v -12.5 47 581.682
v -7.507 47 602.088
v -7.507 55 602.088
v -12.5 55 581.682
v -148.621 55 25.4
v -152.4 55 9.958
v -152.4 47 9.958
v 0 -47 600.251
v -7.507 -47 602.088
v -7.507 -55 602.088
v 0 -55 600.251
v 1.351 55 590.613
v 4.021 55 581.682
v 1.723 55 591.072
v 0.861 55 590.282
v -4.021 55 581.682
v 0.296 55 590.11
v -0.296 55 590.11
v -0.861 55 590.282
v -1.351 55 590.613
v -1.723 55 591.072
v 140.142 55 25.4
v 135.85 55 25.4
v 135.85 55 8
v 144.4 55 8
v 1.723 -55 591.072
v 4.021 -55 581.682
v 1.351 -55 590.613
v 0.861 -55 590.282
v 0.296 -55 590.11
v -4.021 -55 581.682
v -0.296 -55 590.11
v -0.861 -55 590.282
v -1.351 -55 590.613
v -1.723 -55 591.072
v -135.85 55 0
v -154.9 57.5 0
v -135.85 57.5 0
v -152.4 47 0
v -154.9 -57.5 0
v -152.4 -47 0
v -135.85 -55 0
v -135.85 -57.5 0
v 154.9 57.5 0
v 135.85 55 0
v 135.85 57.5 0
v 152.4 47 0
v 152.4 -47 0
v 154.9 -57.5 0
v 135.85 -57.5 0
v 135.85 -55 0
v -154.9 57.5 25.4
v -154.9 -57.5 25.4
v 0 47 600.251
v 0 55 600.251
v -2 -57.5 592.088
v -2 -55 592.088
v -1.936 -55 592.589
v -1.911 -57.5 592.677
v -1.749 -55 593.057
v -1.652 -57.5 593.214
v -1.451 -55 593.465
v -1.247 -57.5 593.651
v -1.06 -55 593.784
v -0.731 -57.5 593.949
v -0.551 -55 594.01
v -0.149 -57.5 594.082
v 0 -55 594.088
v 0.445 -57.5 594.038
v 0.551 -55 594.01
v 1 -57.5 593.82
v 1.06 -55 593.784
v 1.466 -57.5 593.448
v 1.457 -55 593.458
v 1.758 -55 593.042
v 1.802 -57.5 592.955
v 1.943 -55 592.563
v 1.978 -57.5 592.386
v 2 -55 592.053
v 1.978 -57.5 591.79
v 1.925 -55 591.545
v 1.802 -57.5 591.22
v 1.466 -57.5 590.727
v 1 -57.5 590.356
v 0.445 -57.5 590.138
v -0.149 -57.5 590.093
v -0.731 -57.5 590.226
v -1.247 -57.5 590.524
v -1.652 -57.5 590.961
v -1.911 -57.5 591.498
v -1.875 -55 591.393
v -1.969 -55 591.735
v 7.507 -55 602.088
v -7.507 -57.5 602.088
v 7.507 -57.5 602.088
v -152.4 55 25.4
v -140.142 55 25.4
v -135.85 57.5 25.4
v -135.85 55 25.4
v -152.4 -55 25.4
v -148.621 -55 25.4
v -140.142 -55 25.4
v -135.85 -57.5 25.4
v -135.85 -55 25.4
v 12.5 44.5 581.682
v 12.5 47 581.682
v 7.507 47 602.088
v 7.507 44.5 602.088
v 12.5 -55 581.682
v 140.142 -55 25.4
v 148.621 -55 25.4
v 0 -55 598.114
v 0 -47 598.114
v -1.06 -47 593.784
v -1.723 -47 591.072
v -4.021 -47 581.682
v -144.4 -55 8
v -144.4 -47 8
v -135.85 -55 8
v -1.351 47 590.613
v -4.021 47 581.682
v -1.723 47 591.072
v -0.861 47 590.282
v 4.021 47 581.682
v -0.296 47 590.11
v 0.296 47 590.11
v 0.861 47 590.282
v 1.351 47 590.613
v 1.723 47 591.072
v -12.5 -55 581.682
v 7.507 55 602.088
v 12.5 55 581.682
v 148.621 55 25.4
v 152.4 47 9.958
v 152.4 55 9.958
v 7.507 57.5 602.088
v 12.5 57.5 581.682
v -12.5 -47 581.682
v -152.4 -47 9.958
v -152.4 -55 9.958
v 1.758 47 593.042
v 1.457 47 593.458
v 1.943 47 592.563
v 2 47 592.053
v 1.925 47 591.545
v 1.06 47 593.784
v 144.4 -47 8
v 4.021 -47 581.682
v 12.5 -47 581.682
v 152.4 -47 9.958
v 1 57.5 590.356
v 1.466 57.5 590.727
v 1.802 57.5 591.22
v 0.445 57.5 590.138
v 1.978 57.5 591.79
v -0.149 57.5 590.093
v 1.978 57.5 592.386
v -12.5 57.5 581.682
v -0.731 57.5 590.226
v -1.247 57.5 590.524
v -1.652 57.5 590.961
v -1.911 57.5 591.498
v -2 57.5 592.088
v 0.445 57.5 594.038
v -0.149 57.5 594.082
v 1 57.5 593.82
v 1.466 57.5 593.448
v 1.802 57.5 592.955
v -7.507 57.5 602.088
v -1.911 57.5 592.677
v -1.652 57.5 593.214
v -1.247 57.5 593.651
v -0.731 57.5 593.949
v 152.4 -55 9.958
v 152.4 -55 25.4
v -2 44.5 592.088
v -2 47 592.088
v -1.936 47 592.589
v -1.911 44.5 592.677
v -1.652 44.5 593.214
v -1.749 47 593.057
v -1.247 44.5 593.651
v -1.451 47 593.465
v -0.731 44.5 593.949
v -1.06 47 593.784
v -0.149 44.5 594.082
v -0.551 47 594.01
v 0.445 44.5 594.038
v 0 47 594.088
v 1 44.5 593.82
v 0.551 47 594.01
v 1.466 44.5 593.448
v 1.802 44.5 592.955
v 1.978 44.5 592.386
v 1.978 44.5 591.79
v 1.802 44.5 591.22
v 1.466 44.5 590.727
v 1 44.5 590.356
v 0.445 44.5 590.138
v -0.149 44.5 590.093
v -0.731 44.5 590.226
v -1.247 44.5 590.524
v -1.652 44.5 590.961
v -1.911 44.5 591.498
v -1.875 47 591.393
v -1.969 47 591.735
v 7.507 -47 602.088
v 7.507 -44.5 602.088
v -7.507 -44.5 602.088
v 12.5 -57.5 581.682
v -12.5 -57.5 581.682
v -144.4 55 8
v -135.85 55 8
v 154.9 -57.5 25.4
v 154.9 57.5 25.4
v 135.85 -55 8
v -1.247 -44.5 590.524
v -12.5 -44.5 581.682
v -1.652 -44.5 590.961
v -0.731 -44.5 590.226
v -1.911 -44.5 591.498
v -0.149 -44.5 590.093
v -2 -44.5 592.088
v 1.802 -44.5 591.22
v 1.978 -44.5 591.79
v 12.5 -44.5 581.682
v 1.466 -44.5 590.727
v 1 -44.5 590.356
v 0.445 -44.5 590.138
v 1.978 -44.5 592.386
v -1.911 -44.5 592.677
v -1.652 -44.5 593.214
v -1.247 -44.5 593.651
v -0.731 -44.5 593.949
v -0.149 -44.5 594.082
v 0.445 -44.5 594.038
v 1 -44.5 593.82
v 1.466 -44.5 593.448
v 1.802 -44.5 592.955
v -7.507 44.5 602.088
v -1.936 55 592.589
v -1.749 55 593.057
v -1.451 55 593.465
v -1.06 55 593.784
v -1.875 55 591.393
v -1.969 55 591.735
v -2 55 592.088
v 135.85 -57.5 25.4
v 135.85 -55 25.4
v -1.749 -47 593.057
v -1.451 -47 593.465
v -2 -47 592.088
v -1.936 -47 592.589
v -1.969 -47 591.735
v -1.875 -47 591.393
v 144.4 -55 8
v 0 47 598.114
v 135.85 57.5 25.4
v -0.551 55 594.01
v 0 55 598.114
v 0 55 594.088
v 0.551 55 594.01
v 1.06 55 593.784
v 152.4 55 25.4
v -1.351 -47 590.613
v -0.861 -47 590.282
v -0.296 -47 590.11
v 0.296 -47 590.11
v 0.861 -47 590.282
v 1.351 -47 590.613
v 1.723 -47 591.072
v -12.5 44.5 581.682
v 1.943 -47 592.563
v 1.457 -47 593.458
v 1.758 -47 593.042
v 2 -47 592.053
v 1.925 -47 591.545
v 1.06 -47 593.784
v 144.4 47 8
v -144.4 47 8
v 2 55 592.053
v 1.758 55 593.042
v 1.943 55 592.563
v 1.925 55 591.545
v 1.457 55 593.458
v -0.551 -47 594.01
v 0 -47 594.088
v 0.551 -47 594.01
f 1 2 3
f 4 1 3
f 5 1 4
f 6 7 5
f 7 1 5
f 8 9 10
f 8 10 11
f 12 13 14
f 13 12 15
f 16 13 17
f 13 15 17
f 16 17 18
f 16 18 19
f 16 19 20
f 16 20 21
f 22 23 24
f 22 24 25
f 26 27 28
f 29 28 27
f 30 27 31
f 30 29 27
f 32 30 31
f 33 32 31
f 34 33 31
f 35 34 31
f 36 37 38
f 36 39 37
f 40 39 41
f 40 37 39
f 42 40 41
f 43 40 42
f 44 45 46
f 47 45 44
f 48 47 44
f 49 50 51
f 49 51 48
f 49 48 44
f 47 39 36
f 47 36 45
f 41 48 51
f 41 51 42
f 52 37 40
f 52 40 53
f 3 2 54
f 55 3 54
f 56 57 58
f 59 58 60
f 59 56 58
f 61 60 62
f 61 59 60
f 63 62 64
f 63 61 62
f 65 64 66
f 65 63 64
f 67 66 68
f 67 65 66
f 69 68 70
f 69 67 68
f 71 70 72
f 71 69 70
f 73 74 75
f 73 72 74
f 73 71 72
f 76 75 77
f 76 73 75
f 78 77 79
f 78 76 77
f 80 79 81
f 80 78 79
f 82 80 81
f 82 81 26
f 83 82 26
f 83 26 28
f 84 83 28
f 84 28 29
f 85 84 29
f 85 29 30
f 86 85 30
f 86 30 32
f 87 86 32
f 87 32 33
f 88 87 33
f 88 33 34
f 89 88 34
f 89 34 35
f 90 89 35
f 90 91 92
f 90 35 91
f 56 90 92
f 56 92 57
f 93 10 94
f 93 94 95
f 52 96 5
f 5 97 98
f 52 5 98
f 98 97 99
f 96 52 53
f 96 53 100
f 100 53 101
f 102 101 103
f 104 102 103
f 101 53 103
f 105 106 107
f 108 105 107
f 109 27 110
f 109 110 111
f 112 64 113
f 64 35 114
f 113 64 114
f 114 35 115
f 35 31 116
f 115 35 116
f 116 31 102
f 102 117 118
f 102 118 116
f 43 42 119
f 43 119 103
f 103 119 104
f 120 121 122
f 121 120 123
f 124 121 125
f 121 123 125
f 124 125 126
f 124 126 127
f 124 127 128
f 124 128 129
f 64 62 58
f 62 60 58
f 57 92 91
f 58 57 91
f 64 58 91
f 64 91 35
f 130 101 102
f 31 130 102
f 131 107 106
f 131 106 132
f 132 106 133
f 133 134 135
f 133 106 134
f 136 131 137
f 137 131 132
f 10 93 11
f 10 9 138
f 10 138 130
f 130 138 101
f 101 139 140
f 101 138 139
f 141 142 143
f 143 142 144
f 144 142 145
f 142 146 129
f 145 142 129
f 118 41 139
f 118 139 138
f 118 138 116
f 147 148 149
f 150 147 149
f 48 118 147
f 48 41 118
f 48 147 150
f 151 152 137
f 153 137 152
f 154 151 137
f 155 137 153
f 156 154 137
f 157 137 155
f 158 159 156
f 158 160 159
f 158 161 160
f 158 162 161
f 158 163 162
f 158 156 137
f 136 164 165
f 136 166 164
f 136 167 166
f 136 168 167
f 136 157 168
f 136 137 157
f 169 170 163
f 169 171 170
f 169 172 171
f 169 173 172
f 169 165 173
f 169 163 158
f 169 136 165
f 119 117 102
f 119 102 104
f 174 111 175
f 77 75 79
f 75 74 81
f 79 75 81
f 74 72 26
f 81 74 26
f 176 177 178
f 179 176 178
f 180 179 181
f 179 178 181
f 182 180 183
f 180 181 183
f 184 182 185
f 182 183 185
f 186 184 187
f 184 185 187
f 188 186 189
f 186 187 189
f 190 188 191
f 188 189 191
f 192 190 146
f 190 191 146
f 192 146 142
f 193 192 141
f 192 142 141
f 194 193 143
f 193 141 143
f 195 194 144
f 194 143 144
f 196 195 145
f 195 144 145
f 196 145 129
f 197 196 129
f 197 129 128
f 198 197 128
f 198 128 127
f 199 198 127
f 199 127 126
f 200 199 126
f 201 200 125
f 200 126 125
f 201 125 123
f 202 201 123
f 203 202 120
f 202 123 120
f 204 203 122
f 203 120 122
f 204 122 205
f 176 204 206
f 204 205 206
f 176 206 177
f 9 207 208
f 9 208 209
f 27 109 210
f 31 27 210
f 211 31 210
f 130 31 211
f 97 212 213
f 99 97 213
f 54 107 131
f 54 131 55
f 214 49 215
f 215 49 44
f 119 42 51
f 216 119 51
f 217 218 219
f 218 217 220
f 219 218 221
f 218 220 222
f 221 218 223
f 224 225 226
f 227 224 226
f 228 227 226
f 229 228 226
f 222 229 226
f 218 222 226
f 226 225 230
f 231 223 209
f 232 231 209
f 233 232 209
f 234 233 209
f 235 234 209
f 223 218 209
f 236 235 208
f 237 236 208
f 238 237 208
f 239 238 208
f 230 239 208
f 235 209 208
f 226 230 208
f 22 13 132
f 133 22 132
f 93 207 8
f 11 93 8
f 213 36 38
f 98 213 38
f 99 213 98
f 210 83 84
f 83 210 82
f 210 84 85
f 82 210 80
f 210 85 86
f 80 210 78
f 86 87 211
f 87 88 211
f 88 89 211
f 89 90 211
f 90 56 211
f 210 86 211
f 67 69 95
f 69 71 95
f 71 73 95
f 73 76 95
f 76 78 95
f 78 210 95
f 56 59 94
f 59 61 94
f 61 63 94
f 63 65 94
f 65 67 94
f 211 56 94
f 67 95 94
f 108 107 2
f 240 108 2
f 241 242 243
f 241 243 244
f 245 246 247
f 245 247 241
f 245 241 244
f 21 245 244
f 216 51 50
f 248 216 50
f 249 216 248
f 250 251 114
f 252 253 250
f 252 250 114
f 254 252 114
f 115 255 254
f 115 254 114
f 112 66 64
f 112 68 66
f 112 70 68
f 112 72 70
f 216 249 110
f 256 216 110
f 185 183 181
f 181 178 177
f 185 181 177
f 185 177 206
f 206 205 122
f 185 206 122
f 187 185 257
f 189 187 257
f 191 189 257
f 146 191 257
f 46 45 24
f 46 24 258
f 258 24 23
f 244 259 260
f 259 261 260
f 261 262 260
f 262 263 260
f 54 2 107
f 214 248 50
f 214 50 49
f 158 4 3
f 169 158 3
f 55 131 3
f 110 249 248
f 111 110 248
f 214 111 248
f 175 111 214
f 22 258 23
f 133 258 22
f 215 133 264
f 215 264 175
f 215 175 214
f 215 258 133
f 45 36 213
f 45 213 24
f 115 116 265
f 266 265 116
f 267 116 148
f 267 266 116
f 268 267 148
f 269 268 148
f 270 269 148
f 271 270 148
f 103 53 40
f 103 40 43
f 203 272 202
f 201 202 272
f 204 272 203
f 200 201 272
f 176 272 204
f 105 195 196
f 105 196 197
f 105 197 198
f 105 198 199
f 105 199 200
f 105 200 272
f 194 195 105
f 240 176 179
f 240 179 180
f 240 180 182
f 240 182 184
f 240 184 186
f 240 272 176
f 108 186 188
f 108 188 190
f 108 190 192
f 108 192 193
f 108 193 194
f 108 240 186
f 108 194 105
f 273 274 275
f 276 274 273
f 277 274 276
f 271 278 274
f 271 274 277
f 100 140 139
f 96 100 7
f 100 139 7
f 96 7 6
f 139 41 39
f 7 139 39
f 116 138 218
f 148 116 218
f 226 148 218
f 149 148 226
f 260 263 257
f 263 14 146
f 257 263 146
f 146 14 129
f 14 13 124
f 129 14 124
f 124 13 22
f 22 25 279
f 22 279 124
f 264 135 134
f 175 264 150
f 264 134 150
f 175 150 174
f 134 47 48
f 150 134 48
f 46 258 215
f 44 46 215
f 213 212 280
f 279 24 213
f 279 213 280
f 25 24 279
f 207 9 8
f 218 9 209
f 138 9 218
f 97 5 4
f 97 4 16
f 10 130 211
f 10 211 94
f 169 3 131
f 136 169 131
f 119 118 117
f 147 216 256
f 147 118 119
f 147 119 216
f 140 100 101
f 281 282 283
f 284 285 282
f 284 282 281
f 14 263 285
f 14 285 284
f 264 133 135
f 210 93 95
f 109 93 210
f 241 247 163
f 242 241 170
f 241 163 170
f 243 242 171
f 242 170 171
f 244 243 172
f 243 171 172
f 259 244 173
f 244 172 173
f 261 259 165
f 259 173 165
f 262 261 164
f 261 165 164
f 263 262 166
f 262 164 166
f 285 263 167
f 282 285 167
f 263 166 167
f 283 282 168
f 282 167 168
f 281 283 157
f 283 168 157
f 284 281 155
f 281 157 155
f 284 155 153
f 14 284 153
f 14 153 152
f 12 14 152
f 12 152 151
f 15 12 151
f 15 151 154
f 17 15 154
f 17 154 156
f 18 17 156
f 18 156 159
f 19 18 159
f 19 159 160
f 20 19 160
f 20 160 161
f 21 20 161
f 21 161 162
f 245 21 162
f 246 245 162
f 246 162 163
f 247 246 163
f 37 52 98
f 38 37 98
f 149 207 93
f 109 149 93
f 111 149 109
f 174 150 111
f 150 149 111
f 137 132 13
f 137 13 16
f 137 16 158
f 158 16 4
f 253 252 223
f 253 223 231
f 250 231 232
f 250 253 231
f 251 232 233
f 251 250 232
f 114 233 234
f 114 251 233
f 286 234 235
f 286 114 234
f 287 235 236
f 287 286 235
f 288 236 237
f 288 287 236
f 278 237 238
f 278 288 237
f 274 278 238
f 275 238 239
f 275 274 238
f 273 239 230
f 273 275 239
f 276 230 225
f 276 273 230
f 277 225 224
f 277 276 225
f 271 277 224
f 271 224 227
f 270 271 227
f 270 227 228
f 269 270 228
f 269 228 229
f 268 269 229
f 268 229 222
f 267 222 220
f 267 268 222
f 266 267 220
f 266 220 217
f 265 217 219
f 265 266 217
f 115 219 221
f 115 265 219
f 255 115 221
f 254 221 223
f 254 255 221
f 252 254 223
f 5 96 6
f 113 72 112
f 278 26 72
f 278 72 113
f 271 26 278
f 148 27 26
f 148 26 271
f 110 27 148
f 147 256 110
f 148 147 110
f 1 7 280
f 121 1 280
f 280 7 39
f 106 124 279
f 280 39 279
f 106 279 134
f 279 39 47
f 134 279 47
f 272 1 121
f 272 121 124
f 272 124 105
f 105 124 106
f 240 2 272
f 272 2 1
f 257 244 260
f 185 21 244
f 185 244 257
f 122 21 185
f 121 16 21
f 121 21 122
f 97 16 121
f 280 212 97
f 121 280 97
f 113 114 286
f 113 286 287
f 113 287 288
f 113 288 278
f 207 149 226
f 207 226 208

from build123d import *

# Parameters (mm, degrees)
F0_W      = 304.8
F0_H      = 8
F1_DEPTH  = 8
F2_DEPTH  = 25.4
F3_W      = 19.05
F3_H      = 25.4
F4_DEPTH  = 2.5
F6_W      = 8
F6_H      = 8
F7_DEPTH  = 25
F9_DEPTH  = 8
F12_DEPTH = 609.6
F13_DEPTH = 609.6
F15_DEPTH = 2.5
F17_DEPTH = 2.5
F18_R     = 2
F19_DEPTH = 13


with BuildPart() as f1:
    # F0 (on Top) → F1 (new body)
    with BuildSketch(Plane.XY):
        with Locations((0, 51)):
            Rectangle(F0_W, F0_H)
    extrude(amount=F1_DEPTH)



with BuildPart() as f1b:
    # F0 (on Top) → F1, piece 2 (new body)
    with BuildSketch(Plane.XY):
        with Locations((0, -51)):
            Rectangle(F0_W, F0_H)
    extrude(amount=F1_DEPTH)


with BuildPart() as f1_1:
    add(f1.part)

    add(f1b.part)  # F2 merges F1b
    # F0 (on Top) → F2 (join)
    with BuildSketch(Plane.XY):
        Polygon((-152.4, 47), (-152.4, 55), (-154.9, 55), (-154.9, -55), (-152.4, -55), (-152.4, -47), align=None)
        Polygon((154.9, 55), (152.4, 55), (152.4, 47), (152.4, -47), (152.4, -55), (154.9, -55), align=None)
    extrude(amount=F2_DEPTH)

    # F3 (on face) → F4 (join)
    with BuildSketch(Plane.XZ.offset(55)):
        with Locations((-145.375, 12.7)):
            Rectangle(F3_W, F3_H)
        with Locations((145.375, 12.7)):
            Rectangle(F3_W, F3_H)
    extrude(amount=F4_DEPTH)

    # F5: F1 across plane


with BuildPart() as f1_2:
    add(f1_1.part)
    add(f1_1.part.mirror(Plane.XZ))

    # F6 (on face) → F7 (join)
    with BuildSketch(Plane.XY.offset(8)):
        with Locations((148.4, -51)):
            Rectangle(F6_W, F6_H)
    extrude(amount=F7_DEPTH)

    # F8 (on face) → F9 (cut)
    with BuildSketch(Plane(origin=(0, -47, 0), x_dir=(-1, 0, 0), z_dir=(0, 1, 0))):
        Polygon((-152.4, 9.9575875458), (-144.4, 8), (-144.4, 33), (-152.4, 33), (-152.4, 25.4), align=None)
    extrude(amount=-F9_DEPTH, mode=Mode.SUBTRACT)

    # F10: F1 across plane


with BuildPart() as f1_3:
    add(f1_2.part)
    add(f1_2.part.mirror(Plane.XZ))

    # F11: F1 across plane


with BuildPart() as f1_4:
    add(f1_3.part)
    add(f1_3.part.mirror(Plane.YZ))

    # F12 (add): faces of the model
    f12_faces = [f1_4.faces().sort_by_distance(p)[0] for p in [
        (148.4, 51, 8.9787937729),
        (148.4, -51, 8.9787937729),
    ]]
    extrude(f12_faces, amount=F12_DEPTH)

    # F13 (add): faces of the model
    f13_faces = [f1_4.faces().sort_by_distance(p)[0] for p in [
        (-148.4, 51, 8.9787937729),
        (-148.4, -51, 8.9787937729),
    ]]
    extrude(f13_faces, amount=F13_DEPTH)

    # F14 (on face) → F15 (join)
    with BuildSketch(Plane(origin=(0, 55, 0), x_dir=(-1, 0, 0), z_dir=(0, 1, 0))):
        Polygon((7.506680038, 602.087713304), (-7.506680038, 602.087713304), (-12.5, 581.6816988801), (12.5, 581.6816988801), align=None)
    extrude(amount=F15_DEPTH)

    # F16 (on face) → F17 (join)
    with BuildSketch(Plane.XZ.offset(-47)):
        Polygon((7.506680038, 602.087713304), (-7.506680038, 602.087713304), (-12.5, 581.6816988801), (12.5, 581.6816988801), align=None)
    extrude(amount=F17_DEPTH)

    # F18 (on face) → F19 (cut, through all)
    with BuildSketch(Plane(origin=(0, 57.5, 0), x_dir=(-1, 0, 0), z_dir=(0, 1, 0))):
        with Locations((0, 592.087713304)):
            Circle(F18_R)
    extrude(amount=-F19_DEPTH, mode=Mode.SUBTRACT)

    # F20: F1 across plane


with BuildPart() as f1_5:
    add(f1_4.part)
    add(f1_4.part.mirror(Plane.XZ))


solid = f1_5.part
